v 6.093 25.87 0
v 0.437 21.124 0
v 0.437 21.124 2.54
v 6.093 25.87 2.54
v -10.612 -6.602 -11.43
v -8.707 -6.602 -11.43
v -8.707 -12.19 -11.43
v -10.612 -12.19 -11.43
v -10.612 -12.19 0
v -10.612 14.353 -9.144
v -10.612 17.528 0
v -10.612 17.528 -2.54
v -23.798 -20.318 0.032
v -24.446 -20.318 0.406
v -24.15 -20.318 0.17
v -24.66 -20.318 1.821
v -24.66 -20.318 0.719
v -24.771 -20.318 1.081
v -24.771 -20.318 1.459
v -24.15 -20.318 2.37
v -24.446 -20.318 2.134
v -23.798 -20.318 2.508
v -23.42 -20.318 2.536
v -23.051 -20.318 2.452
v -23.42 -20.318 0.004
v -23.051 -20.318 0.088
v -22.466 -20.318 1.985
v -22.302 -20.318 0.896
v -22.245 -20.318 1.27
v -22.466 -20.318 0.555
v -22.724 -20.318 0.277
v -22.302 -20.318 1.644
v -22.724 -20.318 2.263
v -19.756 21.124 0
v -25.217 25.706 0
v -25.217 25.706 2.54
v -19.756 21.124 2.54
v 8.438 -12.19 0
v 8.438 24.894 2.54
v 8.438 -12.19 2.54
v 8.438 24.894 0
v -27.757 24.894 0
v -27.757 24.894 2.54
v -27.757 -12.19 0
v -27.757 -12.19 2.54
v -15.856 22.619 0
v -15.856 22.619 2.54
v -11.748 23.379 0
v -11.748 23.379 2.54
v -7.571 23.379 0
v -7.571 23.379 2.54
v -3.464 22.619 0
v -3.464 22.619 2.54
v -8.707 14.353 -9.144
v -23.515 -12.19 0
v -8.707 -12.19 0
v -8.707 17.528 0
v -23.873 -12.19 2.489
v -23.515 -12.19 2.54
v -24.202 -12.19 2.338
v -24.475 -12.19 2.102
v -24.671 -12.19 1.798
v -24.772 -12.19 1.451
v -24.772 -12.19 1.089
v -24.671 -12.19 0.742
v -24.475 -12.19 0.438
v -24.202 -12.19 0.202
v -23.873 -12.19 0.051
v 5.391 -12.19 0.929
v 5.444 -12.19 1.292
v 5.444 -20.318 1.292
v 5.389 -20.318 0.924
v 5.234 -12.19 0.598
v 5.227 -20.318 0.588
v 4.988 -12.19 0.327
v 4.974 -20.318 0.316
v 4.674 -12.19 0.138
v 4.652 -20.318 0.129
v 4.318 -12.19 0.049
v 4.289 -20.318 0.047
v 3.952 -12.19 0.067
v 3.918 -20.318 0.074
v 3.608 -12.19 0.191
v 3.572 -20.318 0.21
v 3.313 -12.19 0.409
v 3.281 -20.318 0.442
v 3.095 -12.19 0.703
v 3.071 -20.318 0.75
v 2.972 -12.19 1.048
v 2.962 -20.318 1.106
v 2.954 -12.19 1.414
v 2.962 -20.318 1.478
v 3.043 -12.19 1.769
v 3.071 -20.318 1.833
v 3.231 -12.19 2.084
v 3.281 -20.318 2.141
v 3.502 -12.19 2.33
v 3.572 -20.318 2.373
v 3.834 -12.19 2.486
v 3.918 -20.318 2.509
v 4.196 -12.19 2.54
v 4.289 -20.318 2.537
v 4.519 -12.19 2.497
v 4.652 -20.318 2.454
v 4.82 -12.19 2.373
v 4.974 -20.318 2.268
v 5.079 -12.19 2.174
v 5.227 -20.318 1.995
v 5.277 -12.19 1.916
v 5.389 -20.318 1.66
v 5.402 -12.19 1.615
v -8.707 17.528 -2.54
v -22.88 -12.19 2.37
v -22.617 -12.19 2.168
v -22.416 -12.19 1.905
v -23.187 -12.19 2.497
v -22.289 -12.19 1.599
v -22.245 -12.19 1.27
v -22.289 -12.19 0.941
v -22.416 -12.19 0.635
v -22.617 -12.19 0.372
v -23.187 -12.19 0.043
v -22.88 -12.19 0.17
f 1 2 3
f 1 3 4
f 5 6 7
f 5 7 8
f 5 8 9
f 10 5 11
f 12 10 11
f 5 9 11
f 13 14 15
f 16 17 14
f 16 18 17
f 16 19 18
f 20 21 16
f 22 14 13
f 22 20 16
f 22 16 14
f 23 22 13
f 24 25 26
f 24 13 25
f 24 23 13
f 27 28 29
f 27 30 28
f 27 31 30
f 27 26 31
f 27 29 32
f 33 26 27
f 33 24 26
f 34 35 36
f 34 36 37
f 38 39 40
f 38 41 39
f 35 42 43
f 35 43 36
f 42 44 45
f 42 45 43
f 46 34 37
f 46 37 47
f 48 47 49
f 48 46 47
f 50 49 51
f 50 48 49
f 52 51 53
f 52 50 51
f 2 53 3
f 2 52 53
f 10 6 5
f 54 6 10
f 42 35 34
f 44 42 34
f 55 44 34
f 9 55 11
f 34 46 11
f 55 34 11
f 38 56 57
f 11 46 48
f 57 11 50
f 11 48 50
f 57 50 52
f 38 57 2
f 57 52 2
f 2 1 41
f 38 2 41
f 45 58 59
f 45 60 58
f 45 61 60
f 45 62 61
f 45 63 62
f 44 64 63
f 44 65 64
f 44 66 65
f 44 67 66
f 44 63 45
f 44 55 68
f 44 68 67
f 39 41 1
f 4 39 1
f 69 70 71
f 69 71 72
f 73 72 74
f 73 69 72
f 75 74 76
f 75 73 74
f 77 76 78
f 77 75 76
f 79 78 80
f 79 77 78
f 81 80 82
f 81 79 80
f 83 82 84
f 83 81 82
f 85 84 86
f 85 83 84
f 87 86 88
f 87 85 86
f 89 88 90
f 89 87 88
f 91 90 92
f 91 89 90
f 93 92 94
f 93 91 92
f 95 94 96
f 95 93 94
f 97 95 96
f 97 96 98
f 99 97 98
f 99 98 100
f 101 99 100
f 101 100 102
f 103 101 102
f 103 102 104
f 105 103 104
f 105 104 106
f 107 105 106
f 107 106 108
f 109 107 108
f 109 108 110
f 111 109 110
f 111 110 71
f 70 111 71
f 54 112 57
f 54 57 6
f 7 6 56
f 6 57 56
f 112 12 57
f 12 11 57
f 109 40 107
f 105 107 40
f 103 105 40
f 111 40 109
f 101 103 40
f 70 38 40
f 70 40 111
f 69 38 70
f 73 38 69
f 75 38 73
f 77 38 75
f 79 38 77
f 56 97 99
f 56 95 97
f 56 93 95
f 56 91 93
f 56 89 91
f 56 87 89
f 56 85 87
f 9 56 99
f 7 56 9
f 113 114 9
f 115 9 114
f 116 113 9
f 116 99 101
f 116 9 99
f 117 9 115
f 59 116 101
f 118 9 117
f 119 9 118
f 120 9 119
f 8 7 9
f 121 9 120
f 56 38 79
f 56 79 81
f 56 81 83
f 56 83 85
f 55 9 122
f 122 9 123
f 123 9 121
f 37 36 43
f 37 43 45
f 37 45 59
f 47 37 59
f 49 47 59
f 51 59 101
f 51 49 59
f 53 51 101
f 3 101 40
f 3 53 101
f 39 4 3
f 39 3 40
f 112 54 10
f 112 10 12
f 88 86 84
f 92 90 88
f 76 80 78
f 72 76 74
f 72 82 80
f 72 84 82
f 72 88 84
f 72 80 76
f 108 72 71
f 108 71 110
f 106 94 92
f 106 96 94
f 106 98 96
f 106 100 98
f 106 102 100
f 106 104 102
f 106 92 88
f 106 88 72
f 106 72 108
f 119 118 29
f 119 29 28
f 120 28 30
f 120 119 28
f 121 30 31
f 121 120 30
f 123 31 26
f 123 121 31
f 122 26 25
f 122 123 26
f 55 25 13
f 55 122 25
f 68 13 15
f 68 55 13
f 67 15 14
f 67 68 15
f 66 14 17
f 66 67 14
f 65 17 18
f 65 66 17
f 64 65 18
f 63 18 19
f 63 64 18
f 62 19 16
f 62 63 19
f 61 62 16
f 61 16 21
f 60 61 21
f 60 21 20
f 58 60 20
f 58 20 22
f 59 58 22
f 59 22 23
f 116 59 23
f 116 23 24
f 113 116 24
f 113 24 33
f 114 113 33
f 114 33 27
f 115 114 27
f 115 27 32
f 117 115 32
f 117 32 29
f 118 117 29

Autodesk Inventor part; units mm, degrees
ref_plane "YZ Plane" through (0, 0, 0) normal (1, 0, 0) x (0, 1, 0)
ref_plane "XZ Plane" through (0, 0, 0) normal (0, 1, 0) x (-1, 0, 0)
ref_plane "XY Plane" through (0, 0, 0) normal (0, 0, 1) x (1, 0, 0)
sketch "Sketch1" plane through (0, 0, 0) normal (0, 0, 1) x (1, 0, 0)
  line L0 (-27.7572, -12.1904) -> (-27.7572, 24.8936)
  line L1 (-27.7572, 24.8936) -> (-25.2172, 25.7064)
  line L2 (-25.2172, 25.7064) -> (-19.7562, 21.1241)
  line L3 (8.4378, 24.8936) -> (8.4378, -12.1904)
  line L4 (8.4378, -12.1904) -> (-27.7572, -12.1904)
  line L5 (8.4378, 24.8936) -> (6.093, 25.8702)
  line L6 (0.4368, 21.1241) -> (6.093, 25.8702)
  arc A0 (0.4368, 21.1241) -> (-19.7562, 21.1241) centre (-9.6597, 0.6145) ccw
  point P0 (0, 0)
  dimension "d0" = 37.084
  dimension "d2" = 36.195
  dimension "d3" = 37.084
  dimension "d4" = 50
  dimension "d6" = 37.8968
  dimension "d7" = 2.54
  dimension "d12" = 8.001
  dimension "d13" = 8.001
  dimension "d15" = 2.54
  dimension "d16" = 50
  dimension "d17" = 38.0607
  dimension "d18" = 22.86
extrude "Extrusion1" add sketch "Sketch1" along normal blind 2.54
sketch "Sketch2" plane through (0, 0, 0) normal (0, 0, -1) x (-1, 0, 0)
  line L0 (8.7072, -12.1904) -> (10.6122, -12.1904)
  line L1 (10.6122, -12.1904) -> (10.6122, 17.5276)
  line L2 (10.6122, 17.5276) -> (8.7072, 17.5276)
  line L3 (8.7072, 17.5276) -> (8.7072, -12.1904)
  line L4 (27.7572, 24.8936) -> (27.7572, -12.1904) projected
  line L5 (27.7572, -12.1904) -> (-8.4378, -12.1904) projected
  point P0 (0, 0)
  dimension "d21" = 29.718
  dimension "d22" = 1.905
  dimension "d23" = 17.145
  dimension "d24" = 0
extrude "Extrusion2" add sketch "Sketch2" along normal blind 11.43
sketch "Sketch3" plane through (-8.7072, -12.1904, 0) normal (1, 0, 0) x (0, 0, -1)
  line L0 (0, 29.718) -> (11.43, 29.718) projected
  line L1 (11.43, 29.718) -> (2.54, 29.718)
  line L2 (9.144, 26.543) -> (2.54, 29.718)
  line L3 (11.43, 29.718) -> (11.43, 5.588)
  line L4 (11.43, 5.588) -> (9.144, 26.543)
  point P0 (0, 12.1904)
  dimension "d27" = 8.89
extrude "Extrusion3" cut sketch "Sketch3" against normal through all
sketch "Sketch4" plane through (-27.7572, -12.1904, 2.54) normal (0, -1, 0) x (1, 0, 0)
  line L0 (0, -2.54) -> (0, 0) projected
  circle A0 centre (4.2418, -1.27) radius 1.27
  line L1 (8.001, 0) -> (2.54, 0) projected
  point P0 (27.7572, -2.54)
extrude "Extrusion4" add sketch "Sketch4" along normal blind 8.128
sketch "Sketch5" plane through (8.4378, -12.1904, 0) normal (0, -1, 0) x (1, 0, 0)
  circle A0 centre (-4.2418, 1.2916) radius 1.2484
  line L0 (-2.3447, 2.54) -> (-8.001, 2.54) projected
  point P0 (-8.4378, 0)
extrude "Extrusion5" add sketch "Sketch5" along normal blind 8.128
sketch "Sketch6" plane through (0, 0, 2.54) normal (0, 0, 1) x (1, 0, 0)
  line L0 (-27.7256, 27.1084) -> (8.5248, 27.1084) construction
  line L1 (8.5248, 27.1084) -> (8.5248, -12.2491) construction
  line L2 (8.5248, -12.2491) -> (-27.7256, -12.2491) construction
  line L3 (-27.7256, -12.2491) -> (-27.7256, 27.1084) construction
  point P0 (0, 0)
decal "Decal1"
properties part number "Assignment 4 - Tiger Face [Complete]"
